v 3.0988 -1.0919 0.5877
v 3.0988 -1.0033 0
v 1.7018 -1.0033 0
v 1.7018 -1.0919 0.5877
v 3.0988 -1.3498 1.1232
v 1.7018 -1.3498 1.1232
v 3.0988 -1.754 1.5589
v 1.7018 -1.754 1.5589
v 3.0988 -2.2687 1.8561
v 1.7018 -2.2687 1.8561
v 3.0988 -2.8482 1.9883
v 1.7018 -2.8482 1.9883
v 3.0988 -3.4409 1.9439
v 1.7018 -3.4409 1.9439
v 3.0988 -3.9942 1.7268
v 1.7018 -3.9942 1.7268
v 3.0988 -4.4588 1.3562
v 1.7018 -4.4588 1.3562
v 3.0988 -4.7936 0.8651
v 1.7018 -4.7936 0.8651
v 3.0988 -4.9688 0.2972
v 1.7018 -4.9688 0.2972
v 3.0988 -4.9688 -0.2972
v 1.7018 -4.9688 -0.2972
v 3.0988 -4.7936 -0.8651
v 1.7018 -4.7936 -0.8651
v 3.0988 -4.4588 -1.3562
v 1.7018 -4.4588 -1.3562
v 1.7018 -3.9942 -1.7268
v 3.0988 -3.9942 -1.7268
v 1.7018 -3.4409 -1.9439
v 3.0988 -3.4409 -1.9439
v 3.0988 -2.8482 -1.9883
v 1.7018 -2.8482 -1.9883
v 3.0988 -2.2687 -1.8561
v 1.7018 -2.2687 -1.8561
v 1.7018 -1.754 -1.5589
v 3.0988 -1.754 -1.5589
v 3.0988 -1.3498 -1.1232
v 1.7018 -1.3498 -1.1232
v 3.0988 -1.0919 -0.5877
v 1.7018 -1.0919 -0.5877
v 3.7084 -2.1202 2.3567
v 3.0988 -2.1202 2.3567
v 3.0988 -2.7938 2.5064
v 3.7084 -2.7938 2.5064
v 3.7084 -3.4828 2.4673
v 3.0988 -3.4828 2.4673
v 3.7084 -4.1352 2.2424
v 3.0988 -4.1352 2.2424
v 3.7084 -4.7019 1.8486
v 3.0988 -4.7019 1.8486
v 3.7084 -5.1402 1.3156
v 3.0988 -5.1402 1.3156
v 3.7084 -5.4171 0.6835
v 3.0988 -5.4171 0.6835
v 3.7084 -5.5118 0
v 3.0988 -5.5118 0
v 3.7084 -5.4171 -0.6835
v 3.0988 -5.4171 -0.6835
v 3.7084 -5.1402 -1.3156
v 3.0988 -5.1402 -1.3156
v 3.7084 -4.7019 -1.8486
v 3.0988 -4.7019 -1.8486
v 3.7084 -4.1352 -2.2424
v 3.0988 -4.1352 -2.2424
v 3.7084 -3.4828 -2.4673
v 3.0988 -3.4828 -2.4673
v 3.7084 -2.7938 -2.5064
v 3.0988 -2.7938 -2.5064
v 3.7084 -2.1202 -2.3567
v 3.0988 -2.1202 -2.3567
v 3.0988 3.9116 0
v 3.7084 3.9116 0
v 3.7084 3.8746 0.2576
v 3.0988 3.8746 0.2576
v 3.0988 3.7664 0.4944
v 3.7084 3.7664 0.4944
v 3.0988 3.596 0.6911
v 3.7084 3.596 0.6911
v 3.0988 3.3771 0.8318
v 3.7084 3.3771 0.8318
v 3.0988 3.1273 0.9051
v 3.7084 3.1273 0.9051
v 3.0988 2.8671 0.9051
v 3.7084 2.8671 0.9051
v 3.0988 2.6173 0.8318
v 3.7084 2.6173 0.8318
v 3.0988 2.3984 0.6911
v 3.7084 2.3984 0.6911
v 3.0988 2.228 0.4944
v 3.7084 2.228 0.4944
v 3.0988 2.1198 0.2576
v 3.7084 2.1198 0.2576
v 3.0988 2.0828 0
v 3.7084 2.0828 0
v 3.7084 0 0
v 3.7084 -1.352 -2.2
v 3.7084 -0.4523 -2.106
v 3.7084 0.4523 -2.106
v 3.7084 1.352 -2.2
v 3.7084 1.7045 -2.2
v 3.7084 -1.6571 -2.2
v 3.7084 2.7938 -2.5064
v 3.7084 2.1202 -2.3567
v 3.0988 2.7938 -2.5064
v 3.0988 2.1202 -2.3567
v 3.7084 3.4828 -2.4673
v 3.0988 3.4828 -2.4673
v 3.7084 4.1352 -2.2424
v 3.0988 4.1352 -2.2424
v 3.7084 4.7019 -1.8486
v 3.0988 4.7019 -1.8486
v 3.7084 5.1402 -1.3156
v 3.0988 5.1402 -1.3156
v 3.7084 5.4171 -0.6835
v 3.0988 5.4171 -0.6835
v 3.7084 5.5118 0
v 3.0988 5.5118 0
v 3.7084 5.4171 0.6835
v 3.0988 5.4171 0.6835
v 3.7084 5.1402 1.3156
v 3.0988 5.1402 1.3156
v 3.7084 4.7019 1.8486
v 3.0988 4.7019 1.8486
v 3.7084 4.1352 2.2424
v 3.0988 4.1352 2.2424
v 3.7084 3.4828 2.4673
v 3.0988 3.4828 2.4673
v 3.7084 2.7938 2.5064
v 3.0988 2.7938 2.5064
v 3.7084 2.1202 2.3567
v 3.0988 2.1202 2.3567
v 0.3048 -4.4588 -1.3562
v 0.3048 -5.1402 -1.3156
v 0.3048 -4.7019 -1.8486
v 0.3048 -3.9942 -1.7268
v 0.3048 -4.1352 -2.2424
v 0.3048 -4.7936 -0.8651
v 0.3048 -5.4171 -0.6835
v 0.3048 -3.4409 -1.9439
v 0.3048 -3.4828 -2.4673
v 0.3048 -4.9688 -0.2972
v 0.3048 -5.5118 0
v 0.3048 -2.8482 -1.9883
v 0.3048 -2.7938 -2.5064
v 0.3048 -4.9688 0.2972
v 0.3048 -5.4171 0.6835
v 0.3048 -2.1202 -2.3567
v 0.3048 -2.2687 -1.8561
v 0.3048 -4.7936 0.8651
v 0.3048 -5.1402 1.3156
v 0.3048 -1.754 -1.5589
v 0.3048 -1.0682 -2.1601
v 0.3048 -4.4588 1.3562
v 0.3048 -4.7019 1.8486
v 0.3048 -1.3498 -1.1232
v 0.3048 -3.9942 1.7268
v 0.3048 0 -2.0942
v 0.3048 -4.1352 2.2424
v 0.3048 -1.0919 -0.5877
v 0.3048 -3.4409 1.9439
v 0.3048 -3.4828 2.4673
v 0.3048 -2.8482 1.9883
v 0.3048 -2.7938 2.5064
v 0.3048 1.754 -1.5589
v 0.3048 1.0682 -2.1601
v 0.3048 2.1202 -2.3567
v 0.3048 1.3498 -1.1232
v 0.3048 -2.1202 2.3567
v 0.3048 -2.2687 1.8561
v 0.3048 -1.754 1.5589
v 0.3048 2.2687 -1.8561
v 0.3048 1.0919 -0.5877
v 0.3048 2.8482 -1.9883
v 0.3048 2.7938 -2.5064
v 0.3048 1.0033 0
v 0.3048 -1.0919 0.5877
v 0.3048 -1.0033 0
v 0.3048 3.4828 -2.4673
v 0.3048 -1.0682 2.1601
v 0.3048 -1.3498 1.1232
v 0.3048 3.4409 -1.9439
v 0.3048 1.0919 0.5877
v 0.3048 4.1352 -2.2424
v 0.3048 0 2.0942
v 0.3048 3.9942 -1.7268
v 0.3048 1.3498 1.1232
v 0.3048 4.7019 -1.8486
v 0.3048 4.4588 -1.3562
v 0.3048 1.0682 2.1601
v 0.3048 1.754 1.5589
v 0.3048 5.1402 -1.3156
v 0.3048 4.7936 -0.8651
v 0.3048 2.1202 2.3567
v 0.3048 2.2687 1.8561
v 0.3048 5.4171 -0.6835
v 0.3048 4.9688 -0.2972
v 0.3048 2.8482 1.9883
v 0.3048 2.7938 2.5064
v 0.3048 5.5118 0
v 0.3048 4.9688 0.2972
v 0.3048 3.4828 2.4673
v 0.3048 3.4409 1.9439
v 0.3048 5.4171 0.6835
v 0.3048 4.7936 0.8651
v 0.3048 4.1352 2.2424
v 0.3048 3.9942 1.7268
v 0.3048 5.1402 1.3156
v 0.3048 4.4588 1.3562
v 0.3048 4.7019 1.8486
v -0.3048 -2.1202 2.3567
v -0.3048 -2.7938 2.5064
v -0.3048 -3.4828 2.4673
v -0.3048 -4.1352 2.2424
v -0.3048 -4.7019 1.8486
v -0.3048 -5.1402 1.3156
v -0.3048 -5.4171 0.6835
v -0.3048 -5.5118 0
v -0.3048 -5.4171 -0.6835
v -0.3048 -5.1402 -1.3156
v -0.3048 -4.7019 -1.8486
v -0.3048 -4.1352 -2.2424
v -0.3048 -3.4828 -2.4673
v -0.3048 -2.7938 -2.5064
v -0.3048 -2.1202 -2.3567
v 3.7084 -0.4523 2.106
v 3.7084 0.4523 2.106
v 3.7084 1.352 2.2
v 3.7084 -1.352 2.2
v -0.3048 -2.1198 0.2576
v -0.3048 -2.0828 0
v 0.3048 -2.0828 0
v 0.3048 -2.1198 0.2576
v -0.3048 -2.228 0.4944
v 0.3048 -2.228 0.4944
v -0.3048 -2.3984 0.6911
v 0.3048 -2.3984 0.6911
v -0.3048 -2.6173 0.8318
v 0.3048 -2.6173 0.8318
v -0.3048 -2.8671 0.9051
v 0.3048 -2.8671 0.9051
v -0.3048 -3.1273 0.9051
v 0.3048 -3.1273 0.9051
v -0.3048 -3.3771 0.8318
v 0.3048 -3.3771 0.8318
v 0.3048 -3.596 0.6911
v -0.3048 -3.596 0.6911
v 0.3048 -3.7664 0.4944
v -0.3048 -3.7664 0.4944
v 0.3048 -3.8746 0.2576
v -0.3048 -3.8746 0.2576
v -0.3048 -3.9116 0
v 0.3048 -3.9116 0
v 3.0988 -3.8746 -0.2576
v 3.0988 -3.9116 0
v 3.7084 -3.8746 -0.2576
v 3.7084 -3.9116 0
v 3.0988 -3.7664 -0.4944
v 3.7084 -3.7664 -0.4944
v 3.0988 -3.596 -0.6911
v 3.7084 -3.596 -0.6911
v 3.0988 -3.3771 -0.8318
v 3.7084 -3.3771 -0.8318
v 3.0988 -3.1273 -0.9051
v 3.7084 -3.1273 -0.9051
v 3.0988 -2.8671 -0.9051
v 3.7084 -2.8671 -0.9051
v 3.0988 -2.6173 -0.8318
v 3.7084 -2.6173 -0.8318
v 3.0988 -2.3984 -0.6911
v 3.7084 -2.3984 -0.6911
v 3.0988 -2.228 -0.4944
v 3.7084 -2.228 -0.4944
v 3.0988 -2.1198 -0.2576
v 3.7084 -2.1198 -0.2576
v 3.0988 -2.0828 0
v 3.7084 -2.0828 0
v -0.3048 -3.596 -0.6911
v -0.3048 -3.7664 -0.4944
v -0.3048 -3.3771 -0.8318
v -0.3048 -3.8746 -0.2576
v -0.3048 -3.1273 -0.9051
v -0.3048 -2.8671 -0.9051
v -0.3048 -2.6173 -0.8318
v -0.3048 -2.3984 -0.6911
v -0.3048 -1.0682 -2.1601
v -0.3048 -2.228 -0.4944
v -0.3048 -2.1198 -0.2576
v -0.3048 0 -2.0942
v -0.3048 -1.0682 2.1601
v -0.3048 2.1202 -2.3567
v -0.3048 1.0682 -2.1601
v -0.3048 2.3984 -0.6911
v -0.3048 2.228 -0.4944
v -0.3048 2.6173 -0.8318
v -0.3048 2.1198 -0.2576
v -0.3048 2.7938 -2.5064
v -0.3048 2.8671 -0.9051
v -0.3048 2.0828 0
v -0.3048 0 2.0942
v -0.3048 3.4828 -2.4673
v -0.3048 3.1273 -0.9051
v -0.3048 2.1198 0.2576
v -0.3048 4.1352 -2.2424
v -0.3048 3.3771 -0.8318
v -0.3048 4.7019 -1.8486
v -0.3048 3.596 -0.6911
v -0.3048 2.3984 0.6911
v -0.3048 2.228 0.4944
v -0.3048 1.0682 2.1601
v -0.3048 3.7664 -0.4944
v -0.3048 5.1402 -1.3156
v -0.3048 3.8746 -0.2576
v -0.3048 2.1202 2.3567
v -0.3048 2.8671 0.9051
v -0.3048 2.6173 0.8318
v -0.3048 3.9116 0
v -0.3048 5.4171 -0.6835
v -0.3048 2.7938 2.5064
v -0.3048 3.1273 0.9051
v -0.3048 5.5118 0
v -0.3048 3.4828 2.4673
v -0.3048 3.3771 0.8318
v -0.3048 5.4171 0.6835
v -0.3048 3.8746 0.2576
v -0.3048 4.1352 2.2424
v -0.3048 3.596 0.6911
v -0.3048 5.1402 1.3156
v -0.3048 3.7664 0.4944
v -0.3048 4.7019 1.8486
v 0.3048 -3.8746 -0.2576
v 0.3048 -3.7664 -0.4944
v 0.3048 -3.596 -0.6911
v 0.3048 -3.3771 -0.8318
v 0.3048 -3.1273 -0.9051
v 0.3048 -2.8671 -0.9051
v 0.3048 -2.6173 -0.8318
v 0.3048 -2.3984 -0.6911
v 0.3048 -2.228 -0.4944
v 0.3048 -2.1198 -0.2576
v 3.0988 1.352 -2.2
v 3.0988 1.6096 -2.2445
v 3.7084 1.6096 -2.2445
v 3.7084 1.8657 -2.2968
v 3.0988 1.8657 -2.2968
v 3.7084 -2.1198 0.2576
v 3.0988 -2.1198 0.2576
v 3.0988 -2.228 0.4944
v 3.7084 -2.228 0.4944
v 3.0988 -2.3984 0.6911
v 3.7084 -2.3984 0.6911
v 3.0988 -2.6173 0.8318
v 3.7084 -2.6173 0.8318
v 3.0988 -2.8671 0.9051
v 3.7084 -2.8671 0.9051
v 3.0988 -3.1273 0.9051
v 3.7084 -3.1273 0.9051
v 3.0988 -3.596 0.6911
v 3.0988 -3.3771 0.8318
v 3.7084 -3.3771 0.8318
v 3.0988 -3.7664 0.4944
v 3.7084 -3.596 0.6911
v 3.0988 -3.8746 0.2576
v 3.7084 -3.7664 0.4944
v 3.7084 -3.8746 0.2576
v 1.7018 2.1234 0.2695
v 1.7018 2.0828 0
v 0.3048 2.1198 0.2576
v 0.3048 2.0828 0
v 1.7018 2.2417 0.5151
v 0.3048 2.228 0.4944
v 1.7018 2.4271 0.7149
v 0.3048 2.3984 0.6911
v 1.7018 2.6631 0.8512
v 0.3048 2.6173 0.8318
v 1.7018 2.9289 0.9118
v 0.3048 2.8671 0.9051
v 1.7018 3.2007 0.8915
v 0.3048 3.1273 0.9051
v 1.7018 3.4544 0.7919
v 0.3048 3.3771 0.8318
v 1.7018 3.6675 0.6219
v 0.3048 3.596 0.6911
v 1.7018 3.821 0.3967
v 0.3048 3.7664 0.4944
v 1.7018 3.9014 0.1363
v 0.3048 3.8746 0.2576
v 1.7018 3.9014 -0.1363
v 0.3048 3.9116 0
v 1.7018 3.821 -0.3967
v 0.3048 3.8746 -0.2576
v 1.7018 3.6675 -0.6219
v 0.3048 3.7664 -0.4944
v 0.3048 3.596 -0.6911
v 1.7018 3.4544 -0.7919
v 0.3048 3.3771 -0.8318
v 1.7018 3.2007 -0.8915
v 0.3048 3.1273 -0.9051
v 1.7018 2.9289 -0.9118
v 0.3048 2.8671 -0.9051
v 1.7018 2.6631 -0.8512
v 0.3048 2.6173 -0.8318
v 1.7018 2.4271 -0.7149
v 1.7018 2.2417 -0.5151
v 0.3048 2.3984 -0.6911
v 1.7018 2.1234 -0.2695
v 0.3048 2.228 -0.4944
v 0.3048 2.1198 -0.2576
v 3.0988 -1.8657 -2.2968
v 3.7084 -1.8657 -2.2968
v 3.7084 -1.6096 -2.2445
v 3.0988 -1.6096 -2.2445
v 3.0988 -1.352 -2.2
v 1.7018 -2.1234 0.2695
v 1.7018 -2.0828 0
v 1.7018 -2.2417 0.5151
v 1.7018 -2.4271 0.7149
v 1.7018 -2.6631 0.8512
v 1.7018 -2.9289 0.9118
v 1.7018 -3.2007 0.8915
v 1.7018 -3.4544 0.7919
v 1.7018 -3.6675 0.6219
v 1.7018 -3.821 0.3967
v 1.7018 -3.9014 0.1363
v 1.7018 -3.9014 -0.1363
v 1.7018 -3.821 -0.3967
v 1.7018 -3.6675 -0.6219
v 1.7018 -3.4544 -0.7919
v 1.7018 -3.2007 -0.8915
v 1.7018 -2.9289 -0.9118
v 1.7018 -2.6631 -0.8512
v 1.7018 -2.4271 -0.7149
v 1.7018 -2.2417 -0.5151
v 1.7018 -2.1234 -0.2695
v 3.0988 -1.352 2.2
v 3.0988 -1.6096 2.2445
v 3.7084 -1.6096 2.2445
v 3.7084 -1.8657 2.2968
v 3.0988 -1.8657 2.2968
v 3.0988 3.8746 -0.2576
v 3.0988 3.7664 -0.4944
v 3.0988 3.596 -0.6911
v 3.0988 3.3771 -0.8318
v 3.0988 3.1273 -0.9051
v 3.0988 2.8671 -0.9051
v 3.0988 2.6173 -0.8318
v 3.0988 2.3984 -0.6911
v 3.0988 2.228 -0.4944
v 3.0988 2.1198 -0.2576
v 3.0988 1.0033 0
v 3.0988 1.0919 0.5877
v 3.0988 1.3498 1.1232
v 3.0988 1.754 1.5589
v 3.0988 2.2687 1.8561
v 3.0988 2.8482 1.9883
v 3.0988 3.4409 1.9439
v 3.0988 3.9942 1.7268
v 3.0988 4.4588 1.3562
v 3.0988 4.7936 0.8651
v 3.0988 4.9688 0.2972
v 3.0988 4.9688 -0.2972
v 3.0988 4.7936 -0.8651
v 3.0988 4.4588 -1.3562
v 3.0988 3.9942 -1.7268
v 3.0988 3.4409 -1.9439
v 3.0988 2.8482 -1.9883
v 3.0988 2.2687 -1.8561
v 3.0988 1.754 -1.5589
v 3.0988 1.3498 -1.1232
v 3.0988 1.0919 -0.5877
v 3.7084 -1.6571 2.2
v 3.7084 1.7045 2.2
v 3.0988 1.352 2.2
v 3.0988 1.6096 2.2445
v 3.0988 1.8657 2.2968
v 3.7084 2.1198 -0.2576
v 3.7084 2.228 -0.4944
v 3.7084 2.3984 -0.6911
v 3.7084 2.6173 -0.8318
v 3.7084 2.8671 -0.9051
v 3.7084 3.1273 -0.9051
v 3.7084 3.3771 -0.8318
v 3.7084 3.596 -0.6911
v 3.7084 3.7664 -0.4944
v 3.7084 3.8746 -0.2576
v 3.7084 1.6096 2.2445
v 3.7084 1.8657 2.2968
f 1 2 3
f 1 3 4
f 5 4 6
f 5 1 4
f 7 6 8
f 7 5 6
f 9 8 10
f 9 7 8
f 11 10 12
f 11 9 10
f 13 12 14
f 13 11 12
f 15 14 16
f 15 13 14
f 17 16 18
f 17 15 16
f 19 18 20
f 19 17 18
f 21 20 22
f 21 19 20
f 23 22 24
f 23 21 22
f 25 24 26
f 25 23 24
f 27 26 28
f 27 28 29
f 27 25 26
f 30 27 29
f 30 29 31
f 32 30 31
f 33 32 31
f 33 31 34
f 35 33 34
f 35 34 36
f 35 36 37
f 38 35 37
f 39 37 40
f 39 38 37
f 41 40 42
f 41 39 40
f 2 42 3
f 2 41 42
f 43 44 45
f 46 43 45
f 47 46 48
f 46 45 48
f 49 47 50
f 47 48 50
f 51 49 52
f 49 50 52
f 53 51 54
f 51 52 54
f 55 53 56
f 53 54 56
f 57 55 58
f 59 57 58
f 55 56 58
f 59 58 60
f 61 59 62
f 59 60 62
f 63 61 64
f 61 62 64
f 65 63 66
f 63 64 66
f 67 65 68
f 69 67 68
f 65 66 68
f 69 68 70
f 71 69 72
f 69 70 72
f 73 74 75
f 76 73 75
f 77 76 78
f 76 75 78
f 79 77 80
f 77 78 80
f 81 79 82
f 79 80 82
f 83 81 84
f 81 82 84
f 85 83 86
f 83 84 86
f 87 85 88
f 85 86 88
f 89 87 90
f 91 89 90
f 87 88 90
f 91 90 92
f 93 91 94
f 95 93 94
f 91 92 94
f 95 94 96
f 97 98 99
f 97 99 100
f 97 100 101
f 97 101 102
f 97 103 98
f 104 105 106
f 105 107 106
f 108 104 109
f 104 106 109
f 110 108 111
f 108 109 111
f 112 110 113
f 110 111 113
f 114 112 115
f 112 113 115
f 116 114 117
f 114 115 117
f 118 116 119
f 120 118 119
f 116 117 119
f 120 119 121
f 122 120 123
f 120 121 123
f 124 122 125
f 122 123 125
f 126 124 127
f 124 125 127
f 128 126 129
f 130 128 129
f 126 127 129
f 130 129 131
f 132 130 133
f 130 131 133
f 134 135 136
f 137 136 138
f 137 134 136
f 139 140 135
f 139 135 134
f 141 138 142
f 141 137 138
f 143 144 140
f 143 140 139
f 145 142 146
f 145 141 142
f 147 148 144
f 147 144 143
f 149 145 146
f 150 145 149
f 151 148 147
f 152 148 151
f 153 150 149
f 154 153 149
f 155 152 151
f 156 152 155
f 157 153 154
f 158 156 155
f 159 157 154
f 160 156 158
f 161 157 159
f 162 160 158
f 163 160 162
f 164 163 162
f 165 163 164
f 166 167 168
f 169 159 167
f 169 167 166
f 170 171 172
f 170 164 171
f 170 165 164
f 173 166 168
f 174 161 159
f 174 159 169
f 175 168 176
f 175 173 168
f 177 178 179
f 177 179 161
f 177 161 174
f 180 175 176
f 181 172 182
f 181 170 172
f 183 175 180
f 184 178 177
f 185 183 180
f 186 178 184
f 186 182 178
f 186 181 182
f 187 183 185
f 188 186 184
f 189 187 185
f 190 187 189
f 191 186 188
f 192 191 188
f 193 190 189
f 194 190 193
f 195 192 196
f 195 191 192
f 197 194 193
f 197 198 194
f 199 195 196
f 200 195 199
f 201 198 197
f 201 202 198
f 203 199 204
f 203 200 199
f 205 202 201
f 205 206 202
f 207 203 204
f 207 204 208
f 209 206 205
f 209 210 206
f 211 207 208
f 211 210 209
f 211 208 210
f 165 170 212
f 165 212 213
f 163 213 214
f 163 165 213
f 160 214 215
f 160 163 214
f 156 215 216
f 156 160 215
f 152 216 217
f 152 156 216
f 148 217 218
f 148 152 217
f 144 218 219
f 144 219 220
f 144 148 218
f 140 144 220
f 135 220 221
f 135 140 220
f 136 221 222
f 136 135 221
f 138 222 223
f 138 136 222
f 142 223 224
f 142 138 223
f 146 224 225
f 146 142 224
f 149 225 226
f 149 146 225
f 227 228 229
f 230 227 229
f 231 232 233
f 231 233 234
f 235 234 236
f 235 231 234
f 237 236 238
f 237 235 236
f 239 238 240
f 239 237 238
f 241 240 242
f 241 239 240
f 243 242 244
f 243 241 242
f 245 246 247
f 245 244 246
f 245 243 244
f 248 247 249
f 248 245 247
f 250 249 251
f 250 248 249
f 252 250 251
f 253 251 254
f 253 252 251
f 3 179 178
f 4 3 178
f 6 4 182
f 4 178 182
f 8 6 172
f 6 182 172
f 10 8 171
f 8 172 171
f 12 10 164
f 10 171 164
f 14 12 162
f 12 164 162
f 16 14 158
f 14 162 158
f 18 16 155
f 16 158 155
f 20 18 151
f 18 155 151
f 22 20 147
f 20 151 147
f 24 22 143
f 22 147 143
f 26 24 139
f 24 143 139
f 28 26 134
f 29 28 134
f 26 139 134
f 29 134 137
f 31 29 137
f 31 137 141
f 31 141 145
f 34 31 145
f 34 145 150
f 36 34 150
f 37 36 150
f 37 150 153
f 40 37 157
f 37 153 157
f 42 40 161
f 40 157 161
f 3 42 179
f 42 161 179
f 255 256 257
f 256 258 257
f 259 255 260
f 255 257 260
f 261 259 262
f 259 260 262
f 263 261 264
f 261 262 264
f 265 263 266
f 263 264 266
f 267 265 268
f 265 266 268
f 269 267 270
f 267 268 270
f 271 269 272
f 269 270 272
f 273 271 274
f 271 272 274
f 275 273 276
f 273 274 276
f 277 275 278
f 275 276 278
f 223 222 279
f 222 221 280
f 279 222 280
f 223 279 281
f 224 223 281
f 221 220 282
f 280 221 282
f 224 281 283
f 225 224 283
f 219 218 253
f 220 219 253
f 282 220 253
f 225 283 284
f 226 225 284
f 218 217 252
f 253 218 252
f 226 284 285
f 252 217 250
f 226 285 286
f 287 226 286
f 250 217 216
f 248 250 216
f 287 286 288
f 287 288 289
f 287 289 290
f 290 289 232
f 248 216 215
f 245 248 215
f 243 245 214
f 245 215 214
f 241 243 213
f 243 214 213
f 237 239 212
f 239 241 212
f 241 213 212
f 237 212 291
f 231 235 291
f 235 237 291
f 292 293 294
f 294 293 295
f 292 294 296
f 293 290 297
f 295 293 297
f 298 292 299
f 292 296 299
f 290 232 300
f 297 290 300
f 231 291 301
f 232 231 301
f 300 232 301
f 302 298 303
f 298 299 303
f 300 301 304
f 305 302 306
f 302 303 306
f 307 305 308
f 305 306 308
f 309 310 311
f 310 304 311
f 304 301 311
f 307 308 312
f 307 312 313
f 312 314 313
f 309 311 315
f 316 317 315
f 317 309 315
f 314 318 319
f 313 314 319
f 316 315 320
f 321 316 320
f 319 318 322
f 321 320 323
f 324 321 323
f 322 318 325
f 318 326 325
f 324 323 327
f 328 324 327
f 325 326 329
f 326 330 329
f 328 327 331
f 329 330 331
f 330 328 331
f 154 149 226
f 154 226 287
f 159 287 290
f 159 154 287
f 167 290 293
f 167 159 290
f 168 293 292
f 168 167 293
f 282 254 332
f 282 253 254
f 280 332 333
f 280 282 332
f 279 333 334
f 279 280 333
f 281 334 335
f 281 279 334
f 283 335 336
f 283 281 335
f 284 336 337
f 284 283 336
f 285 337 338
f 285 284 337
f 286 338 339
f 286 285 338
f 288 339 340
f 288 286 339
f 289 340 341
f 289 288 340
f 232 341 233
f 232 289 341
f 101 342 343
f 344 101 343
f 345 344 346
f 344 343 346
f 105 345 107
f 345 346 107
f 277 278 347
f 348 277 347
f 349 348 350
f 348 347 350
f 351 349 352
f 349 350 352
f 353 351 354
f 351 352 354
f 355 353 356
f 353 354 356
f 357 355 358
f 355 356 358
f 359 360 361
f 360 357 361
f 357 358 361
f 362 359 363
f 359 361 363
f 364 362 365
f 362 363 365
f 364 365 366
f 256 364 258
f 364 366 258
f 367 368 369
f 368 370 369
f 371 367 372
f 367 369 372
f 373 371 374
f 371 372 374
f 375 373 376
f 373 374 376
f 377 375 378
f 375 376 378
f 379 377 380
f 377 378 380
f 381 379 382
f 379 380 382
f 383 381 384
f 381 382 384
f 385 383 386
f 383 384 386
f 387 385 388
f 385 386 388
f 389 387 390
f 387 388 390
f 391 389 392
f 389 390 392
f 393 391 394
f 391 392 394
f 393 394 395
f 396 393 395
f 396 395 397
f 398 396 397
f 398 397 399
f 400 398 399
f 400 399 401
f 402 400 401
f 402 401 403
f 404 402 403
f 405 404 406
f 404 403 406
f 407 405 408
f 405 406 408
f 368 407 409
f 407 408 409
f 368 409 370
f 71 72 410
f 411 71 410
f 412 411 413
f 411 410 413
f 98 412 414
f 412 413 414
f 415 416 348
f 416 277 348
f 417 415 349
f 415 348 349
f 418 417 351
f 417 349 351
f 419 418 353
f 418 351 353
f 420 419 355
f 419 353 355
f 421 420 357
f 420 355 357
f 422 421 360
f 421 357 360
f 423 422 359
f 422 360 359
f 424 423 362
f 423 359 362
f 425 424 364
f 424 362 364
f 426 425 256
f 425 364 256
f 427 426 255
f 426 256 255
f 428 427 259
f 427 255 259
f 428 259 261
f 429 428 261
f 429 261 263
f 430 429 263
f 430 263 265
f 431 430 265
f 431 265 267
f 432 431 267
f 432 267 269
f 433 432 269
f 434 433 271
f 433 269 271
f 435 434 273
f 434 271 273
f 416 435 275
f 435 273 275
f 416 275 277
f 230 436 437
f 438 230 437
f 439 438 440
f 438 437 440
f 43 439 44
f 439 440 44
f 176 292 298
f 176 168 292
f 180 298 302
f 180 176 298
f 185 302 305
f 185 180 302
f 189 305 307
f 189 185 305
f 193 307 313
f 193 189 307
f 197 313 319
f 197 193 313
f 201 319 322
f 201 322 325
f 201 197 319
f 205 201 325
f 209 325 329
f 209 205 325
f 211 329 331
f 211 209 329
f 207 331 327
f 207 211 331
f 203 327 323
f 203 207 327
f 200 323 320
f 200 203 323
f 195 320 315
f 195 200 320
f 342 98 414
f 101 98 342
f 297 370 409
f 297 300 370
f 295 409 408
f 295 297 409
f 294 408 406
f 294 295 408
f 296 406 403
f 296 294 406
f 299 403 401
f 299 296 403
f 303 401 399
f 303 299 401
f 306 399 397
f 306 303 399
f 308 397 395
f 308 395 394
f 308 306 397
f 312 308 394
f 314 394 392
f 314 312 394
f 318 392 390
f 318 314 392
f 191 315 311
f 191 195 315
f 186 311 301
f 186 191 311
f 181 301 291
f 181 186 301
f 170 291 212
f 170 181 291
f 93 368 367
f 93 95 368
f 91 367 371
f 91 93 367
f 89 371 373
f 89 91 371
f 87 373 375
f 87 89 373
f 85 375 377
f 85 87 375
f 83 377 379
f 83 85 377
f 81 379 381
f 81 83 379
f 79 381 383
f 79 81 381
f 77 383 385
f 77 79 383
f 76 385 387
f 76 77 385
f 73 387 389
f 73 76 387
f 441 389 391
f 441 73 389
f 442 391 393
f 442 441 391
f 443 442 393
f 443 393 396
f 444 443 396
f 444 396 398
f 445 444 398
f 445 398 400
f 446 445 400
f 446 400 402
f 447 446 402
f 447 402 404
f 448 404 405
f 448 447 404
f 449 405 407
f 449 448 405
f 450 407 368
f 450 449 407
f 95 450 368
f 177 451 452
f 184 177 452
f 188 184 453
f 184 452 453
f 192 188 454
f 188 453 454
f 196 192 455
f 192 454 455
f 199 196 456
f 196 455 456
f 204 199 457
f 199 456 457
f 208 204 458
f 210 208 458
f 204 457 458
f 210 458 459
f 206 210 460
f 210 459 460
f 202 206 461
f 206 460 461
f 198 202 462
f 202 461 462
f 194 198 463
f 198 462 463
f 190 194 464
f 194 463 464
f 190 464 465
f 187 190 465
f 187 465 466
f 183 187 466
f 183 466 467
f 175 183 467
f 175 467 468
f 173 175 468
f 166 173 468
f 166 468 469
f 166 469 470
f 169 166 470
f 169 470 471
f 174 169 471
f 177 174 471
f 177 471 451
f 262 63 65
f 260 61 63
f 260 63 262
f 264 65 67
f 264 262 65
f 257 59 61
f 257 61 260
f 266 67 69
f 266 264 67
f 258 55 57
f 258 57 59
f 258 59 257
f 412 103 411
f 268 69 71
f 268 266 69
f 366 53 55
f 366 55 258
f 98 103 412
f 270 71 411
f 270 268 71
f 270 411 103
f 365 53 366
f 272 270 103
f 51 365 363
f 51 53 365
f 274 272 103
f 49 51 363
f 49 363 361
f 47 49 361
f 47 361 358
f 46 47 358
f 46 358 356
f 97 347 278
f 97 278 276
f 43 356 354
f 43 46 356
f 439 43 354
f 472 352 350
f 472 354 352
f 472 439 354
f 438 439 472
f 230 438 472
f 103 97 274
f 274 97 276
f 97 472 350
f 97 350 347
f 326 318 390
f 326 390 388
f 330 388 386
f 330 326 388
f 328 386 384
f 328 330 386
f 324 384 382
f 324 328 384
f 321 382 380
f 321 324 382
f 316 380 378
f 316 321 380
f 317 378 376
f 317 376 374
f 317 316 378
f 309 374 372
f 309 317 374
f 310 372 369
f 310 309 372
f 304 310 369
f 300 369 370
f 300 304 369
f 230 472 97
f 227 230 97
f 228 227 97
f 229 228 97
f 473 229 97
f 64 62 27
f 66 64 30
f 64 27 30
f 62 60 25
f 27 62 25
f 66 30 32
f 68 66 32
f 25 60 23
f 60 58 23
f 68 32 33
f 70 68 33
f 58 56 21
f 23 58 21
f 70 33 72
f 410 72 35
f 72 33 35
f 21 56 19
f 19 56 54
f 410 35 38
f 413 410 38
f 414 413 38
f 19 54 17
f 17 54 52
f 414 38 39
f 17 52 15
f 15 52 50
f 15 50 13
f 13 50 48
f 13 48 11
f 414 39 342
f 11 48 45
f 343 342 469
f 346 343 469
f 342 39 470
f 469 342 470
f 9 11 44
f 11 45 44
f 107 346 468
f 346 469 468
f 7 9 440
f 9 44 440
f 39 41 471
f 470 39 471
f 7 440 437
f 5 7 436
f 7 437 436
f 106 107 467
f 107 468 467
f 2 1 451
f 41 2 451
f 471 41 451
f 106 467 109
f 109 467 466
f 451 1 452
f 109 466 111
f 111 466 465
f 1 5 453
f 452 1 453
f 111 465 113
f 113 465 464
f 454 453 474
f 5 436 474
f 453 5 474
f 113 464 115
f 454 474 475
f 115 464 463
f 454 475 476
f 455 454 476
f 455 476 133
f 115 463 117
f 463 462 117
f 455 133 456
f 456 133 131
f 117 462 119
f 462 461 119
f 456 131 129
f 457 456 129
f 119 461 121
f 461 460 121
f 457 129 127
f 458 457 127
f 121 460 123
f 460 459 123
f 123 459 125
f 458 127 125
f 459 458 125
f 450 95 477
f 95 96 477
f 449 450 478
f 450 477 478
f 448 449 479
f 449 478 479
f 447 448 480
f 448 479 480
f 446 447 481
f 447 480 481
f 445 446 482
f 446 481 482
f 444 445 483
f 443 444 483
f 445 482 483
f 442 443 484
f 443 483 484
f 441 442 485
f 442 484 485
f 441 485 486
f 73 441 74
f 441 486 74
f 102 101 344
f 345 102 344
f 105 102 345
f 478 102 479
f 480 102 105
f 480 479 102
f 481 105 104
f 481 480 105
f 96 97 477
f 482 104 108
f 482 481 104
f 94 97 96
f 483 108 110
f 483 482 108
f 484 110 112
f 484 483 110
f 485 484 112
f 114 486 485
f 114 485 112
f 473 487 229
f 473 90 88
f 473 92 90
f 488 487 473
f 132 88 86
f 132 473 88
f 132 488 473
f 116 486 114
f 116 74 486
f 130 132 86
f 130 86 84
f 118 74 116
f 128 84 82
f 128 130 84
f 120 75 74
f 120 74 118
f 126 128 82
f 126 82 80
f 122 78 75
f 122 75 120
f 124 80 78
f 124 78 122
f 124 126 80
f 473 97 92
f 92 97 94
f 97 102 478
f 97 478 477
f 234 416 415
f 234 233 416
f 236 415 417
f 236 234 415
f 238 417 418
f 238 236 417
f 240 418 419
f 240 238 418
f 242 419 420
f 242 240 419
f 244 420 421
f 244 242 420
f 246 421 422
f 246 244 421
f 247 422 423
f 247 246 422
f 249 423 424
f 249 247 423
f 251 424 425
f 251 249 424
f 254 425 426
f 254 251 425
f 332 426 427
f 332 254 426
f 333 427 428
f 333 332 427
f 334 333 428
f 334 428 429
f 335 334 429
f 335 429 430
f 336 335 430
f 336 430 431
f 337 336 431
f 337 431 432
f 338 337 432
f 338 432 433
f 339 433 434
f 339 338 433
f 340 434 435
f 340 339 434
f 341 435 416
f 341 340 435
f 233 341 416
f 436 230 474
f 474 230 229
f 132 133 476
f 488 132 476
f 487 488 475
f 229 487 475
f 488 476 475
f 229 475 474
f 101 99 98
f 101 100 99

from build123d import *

# Parameters (mm, degrees)
F0_R     = 0.9144
F1_DEPTH = 0.3048
F2_R     = 1.9939
F2_R_2   = 0.9144
F3_DEPTH = 1.397
F8_DEPTH = 0.6096


# Not quite as in the source:
# - a pattern or mirror of a feature is missing from the dataset's text; its kind, count and spacing are read off the source's solid


with BuildPart() as f1:
    # F0 (on Right) → F1 (new body, symmetric)
    with BuildSketch(Plane.YZ):
        with BuildLine():
            ThreePointArc((2.1201945262, 2.3567084162), (0, 2.094238318), (-2.1201945262, 2.3567084162))
            ThreePointArc((-2.1201945262, 2.3567084162), (-5.5118, 0), (-2.1201945262, -2.3567084162))
            ThreePointArc((-2.1201945262, -2.3567084162), (0, -2.094238318), (2.1201945262, -2.3567084162))
            ThreePointArc((2.1201945262, -2.3567084162), (5.5118, 0), (2.1201945262, 2.3567084162))
        make_face()
        with Locations((-2.9972, 0)):
            Circle(F0_R, mode=Mode.SUBTRACT)
        with Locations((2.9972, 0)):
            Circle(F0_R, mode=Mode.SUBTRACT)
    extrude(amount=F1_DEPTH, both=True)

    # F2 (on face) → F3 (join)
    with BuildSketch(Plane.YZ.offset(0.3048)):
        with Locations((-2.9972, 0)):
            Circle(F2_R)
        with Locations((-2.9972, 0)):
            Circle(F2_R_2, mode=Mode.SUBTRACT)
    extrude(amount=F3_DEPTH)

    # F4: F1 across plane


with BuildPart() as f1_1:
    add(f1.part)
    add(f1.part.mirror(Plane.XZ))

    # F5: F1 across face


with BuildPart() as f1_2:
    add(f1_1.part)
    add(f1_1.part.mirror(Plane(origin=(1.7018, -2.9972, 0), x_dir=(0, 1, 0), z_dir=(1, 0, 0))))

    # F7 (on face) → F8 (join, through all)
    with BuildSketch(Plane.YZ.offset(3.7084)):
        Polygon((1.7045348049, -2.2), (0, 0), (-1.6570564457, -2.2), align=None)
    f8 = extrude(amount=-F8_DEPTH)

    # F8_copies: F8 across plane
    add(f8.mirror(Plane.XY))


solid = f1_2.part
